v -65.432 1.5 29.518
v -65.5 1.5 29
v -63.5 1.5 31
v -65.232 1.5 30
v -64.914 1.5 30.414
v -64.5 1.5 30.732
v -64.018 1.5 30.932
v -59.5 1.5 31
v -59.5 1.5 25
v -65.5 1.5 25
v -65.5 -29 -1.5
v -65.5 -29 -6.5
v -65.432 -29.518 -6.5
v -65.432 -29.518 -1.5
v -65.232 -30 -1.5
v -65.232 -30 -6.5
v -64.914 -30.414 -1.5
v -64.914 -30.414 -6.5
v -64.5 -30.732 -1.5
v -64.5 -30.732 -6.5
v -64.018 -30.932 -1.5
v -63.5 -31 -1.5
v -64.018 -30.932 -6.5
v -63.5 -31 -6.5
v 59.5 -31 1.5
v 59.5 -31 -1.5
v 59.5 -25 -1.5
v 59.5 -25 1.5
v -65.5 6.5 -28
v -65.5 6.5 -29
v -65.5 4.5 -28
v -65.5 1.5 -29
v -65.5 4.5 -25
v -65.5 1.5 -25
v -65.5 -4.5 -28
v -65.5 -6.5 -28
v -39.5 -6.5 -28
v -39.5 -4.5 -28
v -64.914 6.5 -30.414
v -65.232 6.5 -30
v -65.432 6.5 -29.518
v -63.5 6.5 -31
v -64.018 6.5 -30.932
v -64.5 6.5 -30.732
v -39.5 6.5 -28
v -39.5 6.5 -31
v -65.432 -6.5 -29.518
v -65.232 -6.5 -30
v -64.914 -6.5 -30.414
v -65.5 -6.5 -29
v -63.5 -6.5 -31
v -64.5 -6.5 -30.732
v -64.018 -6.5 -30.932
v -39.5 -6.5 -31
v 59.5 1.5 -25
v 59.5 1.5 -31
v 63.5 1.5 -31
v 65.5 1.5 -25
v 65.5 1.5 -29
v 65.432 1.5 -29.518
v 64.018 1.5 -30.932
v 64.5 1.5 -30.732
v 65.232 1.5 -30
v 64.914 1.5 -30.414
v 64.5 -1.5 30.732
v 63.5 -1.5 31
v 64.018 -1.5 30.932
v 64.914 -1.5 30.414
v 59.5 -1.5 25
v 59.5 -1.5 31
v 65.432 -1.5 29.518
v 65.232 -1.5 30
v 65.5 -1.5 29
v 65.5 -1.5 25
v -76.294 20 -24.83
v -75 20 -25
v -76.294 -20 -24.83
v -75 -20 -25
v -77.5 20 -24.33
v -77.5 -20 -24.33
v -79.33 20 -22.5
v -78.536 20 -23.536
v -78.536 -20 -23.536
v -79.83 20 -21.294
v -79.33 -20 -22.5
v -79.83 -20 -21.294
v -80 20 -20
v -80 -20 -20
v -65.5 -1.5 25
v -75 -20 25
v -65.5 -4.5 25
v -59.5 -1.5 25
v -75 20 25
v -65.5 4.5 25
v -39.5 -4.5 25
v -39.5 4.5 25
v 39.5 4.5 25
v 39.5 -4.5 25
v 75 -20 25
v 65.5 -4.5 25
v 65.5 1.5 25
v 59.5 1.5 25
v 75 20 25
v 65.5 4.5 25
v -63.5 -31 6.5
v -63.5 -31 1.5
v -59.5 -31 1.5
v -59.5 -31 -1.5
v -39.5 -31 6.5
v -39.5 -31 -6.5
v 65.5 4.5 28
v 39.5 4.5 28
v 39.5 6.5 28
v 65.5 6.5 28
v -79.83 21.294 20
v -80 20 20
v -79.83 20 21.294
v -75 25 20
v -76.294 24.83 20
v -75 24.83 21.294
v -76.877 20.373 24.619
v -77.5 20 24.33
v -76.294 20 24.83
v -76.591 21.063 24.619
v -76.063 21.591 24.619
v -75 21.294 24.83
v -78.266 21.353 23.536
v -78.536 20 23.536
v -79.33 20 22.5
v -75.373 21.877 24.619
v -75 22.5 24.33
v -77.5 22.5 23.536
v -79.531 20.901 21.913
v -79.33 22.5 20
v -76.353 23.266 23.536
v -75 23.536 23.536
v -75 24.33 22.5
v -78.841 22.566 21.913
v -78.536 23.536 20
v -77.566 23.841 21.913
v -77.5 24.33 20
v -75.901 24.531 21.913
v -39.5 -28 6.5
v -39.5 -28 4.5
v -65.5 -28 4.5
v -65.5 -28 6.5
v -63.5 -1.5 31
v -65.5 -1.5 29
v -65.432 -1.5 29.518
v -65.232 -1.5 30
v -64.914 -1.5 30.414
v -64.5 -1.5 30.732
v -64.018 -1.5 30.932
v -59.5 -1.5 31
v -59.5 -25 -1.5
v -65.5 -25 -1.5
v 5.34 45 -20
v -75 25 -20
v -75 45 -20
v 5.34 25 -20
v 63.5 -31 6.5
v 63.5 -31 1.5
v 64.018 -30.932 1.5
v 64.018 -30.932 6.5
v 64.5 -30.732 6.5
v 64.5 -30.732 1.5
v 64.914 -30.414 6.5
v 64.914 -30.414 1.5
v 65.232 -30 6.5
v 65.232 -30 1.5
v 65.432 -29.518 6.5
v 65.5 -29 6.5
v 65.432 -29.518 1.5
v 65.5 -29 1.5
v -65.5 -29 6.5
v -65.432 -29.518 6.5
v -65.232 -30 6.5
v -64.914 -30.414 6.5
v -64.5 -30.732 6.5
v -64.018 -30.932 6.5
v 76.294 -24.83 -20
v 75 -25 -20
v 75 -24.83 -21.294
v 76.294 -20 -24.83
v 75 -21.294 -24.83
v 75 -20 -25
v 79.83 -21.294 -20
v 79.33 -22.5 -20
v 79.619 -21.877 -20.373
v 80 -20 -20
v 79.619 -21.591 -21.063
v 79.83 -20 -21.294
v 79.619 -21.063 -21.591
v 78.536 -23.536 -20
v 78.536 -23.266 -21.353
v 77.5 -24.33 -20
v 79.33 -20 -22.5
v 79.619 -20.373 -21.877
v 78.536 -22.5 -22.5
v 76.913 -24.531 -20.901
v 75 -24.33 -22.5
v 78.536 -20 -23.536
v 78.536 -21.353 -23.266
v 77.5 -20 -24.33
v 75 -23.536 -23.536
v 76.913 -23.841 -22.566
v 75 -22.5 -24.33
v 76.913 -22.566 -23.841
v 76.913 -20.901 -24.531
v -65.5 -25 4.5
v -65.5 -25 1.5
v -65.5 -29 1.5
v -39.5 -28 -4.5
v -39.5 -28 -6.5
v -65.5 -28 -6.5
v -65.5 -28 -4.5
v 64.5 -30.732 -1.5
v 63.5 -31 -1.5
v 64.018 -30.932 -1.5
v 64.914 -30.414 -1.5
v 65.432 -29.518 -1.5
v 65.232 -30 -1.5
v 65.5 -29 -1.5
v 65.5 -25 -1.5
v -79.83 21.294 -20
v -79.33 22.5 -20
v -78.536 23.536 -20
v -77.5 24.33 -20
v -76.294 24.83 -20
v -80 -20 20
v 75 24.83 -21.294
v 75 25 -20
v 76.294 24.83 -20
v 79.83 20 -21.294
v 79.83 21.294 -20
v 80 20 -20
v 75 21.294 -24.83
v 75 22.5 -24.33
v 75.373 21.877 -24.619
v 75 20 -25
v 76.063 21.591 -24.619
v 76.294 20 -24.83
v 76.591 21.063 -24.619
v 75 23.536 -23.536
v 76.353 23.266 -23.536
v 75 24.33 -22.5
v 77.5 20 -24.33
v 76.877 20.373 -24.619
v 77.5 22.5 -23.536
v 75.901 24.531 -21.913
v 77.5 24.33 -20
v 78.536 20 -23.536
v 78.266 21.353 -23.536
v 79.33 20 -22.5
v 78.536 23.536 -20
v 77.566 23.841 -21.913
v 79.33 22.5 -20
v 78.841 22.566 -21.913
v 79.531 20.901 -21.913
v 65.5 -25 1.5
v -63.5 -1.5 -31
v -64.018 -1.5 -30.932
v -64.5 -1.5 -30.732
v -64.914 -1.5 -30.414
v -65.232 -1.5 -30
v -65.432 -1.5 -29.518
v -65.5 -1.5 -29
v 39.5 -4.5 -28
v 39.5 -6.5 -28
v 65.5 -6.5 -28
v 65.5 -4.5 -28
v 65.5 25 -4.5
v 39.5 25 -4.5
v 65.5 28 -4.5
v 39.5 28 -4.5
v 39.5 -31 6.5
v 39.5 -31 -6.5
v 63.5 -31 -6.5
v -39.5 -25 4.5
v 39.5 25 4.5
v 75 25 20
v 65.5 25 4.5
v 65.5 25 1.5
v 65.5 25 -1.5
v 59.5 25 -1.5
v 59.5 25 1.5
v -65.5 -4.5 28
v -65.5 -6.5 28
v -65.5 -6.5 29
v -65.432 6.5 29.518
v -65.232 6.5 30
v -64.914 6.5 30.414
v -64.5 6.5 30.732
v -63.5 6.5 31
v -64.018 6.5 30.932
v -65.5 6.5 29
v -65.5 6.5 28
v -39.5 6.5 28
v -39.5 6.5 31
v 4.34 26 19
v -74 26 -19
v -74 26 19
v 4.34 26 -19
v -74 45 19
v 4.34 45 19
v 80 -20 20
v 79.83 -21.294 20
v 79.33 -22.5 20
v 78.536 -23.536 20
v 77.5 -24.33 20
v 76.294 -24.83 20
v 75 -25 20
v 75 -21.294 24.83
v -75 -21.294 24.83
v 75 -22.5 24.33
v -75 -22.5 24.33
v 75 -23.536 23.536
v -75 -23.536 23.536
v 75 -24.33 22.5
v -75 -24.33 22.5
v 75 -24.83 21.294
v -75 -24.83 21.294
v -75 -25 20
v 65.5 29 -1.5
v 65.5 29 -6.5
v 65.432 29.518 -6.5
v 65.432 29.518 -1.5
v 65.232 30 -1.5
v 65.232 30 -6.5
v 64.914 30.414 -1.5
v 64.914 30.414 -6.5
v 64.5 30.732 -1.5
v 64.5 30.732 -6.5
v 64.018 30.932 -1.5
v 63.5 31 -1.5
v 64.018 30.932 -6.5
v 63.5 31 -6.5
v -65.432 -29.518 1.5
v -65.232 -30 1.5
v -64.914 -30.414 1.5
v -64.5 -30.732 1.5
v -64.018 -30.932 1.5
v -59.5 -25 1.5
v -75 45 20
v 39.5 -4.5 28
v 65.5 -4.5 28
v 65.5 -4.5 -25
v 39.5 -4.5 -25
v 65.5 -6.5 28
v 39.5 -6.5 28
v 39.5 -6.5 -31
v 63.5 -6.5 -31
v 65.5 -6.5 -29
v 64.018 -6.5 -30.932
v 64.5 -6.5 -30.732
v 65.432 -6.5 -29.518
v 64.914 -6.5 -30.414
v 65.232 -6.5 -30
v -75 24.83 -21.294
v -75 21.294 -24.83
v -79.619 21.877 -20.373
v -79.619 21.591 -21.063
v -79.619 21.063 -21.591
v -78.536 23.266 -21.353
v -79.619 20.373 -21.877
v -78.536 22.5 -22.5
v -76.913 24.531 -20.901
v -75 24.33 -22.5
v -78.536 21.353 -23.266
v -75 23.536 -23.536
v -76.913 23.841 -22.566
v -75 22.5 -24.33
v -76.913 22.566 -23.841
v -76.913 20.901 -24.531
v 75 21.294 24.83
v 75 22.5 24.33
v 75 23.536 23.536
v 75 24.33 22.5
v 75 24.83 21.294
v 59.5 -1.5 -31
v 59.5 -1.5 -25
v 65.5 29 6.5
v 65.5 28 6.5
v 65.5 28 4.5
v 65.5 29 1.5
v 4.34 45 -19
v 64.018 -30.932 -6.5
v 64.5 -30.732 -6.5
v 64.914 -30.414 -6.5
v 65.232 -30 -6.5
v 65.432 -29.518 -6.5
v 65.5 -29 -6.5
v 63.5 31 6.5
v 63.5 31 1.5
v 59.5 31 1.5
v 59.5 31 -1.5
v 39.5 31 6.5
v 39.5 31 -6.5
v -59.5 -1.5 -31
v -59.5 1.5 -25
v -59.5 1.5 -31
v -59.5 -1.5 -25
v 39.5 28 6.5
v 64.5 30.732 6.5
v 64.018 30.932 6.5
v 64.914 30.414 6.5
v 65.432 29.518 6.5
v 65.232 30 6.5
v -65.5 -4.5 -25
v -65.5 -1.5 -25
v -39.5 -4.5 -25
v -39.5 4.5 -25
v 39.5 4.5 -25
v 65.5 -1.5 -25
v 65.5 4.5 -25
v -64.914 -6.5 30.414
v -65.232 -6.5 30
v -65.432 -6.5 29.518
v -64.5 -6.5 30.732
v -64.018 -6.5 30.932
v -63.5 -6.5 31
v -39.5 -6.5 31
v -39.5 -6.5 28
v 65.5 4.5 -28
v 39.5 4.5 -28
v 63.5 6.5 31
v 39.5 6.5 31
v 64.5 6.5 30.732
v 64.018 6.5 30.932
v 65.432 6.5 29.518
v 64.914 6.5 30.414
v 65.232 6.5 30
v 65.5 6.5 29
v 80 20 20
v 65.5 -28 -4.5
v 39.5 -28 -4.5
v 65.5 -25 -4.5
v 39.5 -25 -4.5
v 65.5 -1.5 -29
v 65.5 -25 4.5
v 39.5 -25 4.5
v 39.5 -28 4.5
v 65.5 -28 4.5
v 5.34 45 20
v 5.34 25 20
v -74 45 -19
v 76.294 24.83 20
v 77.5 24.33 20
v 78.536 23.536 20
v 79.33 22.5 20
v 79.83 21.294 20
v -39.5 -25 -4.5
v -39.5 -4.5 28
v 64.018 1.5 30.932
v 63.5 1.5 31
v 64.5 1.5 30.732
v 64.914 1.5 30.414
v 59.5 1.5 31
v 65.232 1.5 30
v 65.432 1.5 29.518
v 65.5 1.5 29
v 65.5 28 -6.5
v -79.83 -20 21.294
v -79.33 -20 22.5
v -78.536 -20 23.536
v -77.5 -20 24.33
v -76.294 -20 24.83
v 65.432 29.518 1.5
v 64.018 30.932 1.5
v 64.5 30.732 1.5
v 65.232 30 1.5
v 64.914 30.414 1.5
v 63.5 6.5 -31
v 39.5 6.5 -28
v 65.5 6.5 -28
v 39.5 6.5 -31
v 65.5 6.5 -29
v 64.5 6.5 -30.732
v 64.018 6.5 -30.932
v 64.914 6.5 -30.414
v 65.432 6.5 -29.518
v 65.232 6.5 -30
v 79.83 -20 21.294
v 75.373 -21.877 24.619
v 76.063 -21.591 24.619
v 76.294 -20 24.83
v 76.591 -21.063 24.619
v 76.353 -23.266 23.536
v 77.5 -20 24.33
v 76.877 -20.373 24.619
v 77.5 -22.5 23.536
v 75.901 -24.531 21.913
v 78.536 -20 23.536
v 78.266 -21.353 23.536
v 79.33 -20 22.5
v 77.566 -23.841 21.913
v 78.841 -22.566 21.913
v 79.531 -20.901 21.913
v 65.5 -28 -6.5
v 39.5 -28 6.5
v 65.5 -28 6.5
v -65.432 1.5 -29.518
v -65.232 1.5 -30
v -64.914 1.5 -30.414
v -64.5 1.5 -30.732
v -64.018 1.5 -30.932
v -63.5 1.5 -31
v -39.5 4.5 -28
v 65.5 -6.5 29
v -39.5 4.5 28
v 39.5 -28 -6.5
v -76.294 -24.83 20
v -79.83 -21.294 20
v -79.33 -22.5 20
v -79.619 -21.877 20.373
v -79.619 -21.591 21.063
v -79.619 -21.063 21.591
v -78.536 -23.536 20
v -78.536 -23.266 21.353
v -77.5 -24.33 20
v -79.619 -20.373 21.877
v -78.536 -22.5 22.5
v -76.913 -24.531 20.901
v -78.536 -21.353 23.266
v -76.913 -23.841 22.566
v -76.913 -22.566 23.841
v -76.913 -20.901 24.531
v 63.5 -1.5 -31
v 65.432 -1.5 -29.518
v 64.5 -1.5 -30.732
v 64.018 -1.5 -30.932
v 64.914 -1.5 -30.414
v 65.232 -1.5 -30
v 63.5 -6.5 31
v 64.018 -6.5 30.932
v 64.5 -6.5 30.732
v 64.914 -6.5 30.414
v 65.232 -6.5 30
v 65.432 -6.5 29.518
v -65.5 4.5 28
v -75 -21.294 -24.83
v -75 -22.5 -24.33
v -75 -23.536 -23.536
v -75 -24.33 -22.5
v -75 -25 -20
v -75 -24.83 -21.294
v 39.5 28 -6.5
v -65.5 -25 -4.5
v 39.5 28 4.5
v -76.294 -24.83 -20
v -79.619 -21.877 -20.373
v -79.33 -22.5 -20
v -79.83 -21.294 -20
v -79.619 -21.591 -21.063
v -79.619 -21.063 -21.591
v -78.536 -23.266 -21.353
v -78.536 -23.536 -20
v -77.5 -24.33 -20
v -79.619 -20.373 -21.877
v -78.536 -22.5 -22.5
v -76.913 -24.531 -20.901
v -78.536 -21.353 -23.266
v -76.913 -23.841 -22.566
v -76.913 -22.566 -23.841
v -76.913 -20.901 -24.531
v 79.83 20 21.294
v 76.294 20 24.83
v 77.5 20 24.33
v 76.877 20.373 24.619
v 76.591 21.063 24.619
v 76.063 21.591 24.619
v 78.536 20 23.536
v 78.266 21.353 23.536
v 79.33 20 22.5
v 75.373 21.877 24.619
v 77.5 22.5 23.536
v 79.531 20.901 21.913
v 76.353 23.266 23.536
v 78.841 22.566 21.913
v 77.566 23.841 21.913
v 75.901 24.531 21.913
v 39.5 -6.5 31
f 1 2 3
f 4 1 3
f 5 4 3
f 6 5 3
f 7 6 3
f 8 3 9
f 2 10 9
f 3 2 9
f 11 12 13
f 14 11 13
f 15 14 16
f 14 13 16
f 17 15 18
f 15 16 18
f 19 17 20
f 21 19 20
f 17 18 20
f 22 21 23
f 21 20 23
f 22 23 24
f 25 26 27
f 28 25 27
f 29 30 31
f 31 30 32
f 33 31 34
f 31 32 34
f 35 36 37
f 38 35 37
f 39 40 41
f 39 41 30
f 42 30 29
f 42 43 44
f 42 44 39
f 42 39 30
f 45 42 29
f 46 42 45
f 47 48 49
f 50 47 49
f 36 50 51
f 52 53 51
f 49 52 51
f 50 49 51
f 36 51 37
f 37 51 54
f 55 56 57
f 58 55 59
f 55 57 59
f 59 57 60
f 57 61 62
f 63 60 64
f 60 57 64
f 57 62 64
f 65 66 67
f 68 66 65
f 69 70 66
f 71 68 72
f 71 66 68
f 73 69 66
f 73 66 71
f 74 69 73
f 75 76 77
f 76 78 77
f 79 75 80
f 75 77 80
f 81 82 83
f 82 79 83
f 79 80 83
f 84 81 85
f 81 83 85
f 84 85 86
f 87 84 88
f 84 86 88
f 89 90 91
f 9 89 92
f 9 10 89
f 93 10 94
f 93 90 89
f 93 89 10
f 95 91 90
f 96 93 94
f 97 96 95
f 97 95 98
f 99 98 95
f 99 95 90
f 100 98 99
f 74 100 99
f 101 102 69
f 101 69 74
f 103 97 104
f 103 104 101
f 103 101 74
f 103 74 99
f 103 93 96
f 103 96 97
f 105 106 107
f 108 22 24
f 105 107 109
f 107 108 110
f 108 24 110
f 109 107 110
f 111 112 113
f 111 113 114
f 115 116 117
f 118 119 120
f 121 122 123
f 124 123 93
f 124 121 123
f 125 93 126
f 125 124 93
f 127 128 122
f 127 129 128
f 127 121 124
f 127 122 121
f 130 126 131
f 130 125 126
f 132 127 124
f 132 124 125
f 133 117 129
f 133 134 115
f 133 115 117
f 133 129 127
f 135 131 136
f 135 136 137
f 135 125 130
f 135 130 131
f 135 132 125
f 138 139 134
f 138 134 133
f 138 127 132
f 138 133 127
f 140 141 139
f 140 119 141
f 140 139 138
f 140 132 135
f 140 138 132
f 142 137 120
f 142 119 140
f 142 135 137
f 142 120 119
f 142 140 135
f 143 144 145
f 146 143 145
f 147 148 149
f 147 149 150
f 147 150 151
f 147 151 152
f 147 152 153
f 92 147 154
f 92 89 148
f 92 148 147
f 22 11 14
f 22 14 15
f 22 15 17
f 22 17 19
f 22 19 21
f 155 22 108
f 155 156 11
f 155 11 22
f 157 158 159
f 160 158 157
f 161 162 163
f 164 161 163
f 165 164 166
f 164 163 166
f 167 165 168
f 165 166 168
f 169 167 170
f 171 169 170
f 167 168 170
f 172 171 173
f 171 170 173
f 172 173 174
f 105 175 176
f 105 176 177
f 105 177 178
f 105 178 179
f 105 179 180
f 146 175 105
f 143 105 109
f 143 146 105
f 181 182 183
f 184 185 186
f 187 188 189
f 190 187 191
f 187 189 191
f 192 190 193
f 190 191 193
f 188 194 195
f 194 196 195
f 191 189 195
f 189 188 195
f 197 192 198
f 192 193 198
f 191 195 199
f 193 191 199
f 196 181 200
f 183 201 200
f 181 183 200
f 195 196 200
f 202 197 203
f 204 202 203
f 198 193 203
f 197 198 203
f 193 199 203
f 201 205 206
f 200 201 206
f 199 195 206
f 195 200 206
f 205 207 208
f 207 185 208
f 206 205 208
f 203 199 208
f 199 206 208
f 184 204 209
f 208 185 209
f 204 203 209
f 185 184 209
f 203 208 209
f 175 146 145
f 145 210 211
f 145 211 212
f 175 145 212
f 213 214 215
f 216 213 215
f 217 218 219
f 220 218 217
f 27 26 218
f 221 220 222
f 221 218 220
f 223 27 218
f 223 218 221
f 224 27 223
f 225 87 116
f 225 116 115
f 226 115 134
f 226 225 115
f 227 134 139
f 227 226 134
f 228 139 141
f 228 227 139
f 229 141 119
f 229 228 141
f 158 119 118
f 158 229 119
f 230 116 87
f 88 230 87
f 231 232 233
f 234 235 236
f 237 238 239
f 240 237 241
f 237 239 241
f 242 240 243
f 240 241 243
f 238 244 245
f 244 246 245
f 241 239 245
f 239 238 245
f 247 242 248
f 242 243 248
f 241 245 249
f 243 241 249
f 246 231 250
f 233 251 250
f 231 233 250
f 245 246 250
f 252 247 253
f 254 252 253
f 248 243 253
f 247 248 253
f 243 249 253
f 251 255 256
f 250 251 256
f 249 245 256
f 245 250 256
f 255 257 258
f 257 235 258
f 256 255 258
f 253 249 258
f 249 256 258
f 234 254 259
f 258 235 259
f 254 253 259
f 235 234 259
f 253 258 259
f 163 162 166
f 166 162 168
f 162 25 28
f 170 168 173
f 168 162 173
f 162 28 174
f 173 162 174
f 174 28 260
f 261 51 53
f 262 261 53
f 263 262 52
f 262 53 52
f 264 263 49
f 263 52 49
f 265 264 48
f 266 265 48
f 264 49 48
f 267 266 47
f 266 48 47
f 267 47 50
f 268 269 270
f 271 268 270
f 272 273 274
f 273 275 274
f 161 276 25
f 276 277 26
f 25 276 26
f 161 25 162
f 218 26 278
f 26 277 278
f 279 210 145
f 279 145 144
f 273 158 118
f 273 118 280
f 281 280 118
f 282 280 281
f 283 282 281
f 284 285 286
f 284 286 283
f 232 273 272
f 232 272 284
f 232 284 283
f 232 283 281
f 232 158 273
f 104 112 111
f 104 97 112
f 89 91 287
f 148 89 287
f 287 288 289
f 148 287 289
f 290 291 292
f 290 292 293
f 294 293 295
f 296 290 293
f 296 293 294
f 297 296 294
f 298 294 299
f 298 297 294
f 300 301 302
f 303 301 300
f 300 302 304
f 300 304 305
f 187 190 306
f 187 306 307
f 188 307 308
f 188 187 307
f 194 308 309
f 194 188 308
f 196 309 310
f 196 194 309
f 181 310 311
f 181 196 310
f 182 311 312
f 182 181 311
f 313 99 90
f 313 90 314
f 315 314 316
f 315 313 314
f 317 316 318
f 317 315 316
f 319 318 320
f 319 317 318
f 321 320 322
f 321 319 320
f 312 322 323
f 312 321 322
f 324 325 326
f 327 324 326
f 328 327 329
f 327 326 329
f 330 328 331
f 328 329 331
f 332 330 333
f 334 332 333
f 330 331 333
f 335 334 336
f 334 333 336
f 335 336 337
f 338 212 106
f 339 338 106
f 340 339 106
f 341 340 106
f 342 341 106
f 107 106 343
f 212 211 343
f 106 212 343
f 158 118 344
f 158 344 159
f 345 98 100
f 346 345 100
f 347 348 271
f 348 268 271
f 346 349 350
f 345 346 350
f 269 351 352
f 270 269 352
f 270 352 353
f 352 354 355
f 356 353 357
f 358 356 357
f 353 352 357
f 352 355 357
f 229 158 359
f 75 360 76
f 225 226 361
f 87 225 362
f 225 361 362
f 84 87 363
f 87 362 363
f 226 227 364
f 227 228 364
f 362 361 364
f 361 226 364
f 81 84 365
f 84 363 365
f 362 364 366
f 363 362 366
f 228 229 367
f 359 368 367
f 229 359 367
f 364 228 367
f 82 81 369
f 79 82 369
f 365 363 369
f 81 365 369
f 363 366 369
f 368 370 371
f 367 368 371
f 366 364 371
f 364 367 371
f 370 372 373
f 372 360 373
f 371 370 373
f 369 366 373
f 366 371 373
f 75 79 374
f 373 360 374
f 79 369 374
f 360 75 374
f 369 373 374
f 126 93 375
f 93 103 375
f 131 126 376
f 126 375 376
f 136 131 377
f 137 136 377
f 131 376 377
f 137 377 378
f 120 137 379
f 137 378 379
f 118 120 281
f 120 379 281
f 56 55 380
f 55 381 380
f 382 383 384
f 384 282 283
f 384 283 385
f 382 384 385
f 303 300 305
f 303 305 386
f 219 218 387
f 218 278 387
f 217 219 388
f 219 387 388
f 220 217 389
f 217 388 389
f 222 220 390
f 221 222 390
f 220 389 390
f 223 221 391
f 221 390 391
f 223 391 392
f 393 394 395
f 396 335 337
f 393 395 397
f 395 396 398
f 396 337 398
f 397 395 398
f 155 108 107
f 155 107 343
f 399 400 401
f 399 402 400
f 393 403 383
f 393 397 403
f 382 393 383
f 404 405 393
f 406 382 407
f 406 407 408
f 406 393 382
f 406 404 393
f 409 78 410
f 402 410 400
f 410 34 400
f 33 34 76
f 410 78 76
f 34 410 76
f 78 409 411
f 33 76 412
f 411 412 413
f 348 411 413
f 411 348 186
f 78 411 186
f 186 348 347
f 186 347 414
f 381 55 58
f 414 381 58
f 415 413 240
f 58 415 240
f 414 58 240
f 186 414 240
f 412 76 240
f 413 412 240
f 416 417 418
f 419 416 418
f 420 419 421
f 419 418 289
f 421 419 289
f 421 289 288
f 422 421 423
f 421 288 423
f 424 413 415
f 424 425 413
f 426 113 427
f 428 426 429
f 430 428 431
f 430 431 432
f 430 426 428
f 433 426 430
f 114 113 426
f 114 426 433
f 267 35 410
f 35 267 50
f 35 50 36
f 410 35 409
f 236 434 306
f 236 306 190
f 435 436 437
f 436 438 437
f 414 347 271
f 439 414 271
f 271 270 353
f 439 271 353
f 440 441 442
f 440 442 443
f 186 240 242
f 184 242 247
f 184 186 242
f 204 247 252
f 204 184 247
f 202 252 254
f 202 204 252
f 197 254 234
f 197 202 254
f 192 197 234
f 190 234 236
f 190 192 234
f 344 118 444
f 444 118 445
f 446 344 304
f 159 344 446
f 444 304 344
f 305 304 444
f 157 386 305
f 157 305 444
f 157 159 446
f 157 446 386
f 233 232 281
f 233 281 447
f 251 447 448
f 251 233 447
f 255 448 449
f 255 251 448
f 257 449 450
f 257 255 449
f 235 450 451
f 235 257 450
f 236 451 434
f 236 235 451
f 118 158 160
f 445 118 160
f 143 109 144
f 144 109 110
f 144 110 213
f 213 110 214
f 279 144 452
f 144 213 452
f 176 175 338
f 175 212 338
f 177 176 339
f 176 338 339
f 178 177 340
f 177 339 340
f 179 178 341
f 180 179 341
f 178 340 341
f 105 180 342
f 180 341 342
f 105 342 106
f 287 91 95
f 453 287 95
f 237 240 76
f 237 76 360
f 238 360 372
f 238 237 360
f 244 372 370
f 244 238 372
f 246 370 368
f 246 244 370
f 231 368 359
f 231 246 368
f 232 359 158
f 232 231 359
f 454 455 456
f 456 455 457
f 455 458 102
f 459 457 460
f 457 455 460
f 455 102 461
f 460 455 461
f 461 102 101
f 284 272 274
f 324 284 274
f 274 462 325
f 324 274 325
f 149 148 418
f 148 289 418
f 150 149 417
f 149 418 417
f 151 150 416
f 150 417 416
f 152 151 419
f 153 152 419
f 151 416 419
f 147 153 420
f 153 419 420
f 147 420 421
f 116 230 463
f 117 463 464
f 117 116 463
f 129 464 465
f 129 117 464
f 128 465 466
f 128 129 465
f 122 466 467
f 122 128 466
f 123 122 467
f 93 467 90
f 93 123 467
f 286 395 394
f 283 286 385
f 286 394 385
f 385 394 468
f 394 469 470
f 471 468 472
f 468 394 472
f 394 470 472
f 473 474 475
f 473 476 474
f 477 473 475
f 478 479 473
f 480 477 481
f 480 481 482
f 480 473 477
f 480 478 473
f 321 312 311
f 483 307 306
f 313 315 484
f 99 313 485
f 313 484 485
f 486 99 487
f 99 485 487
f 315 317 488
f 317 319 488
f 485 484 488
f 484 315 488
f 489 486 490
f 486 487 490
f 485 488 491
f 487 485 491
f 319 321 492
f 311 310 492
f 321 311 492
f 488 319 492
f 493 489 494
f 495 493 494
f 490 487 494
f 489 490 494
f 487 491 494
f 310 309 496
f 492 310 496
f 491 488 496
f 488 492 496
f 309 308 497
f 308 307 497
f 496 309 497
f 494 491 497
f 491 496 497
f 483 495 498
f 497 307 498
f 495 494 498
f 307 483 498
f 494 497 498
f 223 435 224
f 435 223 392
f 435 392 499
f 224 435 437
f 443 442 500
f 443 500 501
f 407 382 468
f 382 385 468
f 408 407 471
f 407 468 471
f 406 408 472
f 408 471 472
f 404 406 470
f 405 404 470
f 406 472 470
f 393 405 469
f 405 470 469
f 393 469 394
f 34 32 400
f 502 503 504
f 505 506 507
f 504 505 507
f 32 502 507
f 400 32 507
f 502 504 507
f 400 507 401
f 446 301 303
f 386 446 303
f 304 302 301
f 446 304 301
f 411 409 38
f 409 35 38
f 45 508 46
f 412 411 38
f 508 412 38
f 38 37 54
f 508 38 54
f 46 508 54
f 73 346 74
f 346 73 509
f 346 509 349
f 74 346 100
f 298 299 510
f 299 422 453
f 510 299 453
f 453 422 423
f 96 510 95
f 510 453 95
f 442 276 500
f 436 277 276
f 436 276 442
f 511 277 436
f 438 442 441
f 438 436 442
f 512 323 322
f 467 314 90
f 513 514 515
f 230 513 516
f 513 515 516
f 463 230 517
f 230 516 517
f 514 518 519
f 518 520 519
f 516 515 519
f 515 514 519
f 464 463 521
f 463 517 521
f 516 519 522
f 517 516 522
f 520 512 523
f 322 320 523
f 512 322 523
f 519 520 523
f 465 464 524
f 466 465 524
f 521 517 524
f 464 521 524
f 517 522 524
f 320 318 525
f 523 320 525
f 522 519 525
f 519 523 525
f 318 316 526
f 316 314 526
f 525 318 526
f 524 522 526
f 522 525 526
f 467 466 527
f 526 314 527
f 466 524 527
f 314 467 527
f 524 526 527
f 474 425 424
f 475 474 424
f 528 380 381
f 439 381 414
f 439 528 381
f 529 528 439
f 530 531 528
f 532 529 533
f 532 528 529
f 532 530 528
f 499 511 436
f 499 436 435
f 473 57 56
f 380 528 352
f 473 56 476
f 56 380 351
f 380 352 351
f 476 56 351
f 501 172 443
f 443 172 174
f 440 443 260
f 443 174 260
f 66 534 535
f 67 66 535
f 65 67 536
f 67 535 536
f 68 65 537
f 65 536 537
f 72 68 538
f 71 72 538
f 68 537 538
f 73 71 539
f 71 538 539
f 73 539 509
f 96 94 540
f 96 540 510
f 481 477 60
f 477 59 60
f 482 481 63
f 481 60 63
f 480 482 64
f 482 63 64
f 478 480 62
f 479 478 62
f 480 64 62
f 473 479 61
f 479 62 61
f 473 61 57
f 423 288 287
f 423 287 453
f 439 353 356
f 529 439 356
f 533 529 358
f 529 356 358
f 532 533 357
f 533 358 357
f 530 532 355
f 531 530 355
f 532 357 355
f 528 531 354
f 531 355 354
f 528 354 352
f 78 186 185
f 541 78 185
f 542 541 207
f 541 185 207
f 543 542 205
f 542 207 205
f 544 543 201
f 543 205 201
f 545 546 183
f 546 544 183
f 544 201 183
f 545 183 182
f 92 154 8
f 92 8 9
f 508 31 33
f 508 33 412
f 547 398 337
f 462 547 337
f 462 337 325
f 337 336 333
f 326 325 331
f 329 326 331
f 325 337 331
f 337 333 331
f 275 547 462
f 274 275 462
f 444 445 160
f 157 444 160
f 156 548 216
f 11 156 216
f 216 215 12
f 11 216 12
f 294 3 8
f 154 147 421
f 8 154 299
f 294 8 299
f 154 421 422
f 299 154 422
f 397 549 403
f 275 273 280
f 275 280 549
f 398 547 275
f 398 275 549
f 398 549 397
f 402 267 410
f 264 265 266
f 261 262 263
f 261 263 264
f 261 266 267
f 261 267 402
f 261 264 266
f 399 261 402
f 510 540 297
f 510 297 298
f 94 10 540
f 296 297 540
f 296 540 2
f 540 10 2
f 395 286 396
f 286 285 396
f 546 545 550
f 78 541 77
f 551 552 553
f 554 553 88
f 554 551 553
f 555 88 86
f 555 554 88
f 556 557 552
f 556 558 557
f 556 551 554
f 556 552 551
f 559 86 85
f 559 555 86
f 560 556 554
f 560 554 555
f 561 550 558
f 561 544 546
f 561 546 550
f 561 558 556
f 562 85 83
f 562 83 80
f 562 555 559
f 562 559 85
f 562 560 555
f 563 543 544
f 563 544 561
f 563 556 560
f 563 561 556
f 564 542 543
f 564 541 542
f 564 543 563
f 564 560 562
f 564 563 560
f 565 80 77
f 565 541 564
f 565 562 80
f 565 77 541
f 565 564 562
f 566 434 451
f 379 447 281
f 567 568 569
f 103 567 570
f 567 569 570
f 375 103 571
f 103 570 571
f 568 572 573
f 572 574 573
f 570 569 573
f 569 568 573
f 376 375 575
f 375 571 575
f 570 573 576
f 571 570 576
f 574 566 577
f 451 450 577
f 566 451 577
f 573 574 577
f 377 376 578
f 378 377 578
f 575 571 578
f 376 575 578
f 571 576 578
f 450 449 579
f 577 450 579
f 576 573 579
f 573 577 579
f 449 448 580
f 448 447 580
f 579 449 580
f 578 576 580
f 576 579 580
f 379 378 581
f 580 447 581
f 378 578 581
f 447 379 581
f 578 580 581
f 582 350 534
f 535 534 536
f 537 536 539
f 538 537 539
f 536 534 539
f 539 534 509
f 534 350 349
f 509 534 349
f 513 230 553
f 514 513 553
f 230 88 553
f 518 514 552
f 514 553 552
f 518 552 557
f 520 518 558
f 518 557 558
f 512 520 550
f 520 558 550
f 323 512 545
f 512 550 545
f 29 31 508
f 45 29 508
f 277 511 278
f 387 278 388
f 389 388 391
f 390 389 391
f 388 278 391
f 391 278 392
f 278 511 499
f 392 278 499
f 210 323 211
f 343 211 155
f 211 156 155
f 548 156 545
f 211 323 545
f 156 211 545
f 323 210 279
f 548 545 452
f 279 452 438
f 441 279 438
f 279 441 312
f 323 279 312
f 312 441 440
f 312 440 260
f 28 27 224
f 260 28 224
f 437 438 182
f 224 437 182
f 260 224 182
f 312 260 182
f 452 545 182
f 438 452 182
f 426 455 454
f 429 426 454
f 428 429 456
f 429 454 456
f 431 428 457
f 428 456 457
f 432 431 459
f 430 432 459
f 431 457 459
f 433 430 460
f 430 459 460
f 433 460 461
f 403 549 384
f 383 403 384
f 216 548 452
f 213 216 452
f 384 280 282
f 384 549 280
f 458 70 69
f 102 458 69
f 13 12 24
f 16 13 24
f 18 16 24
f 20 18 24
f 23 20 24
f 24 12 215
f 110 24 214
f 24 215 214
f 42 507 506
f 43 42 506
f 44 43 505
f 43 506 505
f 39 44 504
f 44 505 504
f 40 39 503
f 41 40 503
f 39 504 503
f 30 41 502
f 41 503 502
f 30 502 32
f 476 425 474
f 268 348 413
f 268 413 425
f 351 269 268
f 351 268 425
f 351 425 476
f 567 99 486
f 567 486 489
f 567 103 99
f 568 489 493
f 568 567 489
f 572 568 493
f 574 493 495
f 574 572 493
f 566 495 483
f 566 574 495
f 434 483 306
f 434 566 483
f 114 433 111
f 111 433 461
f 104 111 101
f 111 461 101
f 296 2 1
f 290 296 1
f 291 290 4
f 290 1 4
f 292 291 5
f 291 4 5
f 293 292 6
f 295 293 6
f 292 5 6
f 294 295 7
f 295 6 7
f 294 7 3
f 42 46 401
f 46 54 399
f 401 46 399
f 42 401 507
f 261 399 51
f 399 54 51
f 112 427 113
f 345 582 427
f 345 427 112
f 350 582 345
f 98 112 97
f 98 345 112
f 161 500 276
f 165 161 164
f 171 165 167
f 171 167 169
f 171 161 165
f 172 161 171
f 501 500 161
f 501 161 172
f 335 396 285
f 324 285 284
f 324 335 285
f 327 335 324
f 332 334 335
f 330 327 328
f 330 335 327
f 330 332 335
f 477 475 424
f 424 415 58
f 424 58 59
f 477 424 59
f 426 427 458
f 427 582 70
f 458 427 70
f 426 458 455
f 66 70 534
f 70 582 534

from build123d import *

# Parameters (mm, degrees)
SKETCH1_W               = 160
SKETCH1_H               = 50
BOSS_EXTRUDE1_DEPTH     = 25
SKETCH2_W               = 26
SKETCH2_H               = 13
CONNECTOR_BASE_DEPTH    = 6
SKETCH3_W               = 2
SKETCH3_H               = 3
DOVETAIL_CUT_DEPTH      = 151.851748415
FILLET1_R               = 2
SKETCH4_W               = 3
SKETCH4_H               = 6
CUT_EXTRUDE1_DEPTH      = 6
CIRPATTERN1_START       = -4.5
CIRPATTERN1_OUTLINE_W   = 20
CIRPATTERN1_OUTLINE_H   = 6
CIRPATTERN1_DEPTH       = 9
CIRPATTERN1_START_2     = -6.5
CIRPATTERN1_2_OUTLINE_W = 20
CIRPATTERN1_2_OUTLINE_H = 3
CIRPATTERN1_2_DEPTH     = 13
CIRPATTERN1_3_DEPTH     = 3
CIRPATTERN1_START_3     = 1.5
CIRPATTERN1_4_DEPTH     = 3
CIRPATTERN1_5_DEPTH     = 2
CIRPATTERN1_START_4     = 4.5
CIRPATTERN1_6_DEPTH     = 2
CIRPATTERN1_7_OUTLINE_W = 20
CIRPATTERN1_7_OUTLINE_H = 6
CIRPATTERN1_7_DEPTH     = 9
CIRPATTERN1_8_OUTLINE_W = 20
CIRPATTERN1_8_OUTLINE_H = 3
CIRPATTERN1_8_DEPTH     = 13
CIRPATTERN1_9_DEPTH     = 3
CIRPATTERN1_10_DEPTH    = 3
CIRPATTERN1_11_DEPTH    = 2
CIRPATTERN1_12_DEPTH    = 2
MIRROR1_START           = -4.5
MIRROR1_OUTLINE_W       = 20
MIRROR1_OUTLINE_H       = 6
MIRROR1_DEPTH           = 9
MIRROR1_START_2         = -6.5
MIRROR1_2_OUTLINE_W     = 20
MIRROR1_2_OUTLINE_H     = 3
MIRROR1_2_DEPTH         = 13
MIRROR1_3_DEPTH         = 3
MIRROR1_START_3         = 1.5
MIRROR1_4_DEPTH         = 3
MIRROR1_5_DEPTH         = 2
MIRROR1_START_4         = 4.5
MIRROR1_6_DEPTH         = 2
MIRROR1_7_OUTLINE_W     = 20
MIRROR1_7_OUTLINE_H     = 6
MIRROR1_7_DEPTH         = 9
MIRROR1_8_OUTLINE_W     = 20
MIRROR1_8_OUTLINE_H     = 3
MIRROR1_8_DEPTH         = 13
MIRROR1_9_DEPTH         = 3
MIRROR1_10_DEPTH        = 3
MIRROR1_11_DEPTH        = 2
MIRROR1_12_DEPTH        = 2
FILLET2_R               = 5
SKETCH5_W               = 26
SKETCH5_H               = 13
CUT_EXTRUDE2_DEPTH      = 103.454868113
SKETCH6_W               = 80.339783693
SKETCH6_H               = 40
BOSS_EXTRUDE2_DEPTH     = 20
SHELL1_T                = -1


# Read off the part's stored shape, not the designer's step: CirPattern1, Mirror1
with BuildPart() as part:
    # Sketch1 → Boss-Extrude1 (new, symmetric)
    with BuildSketch(Plane(origin=(0, 0, 0), x_dir=(1, 0, 0), z_dir=(0, 1, 0))):
        Rectangle(SKETCH1_W, SKETCH1_H)
    extrude(amount=BOSS_EXTRUDE1_DEPTH, both=True)

    # Sketch2 → connector base (add)
    with BuildSketch(Plane(origin=(0, 25, 0), x_dir=(1, 0, 0), z_dir=(0, 1, 0))):
        with Locations((-52.5, 0)):
            Rectangle(SKETCH2_W, SKETCH2_H)
    extrude(amount=CONNECTOR_BASE_DEPTH)

    # Sketch3 → dovetail cut (cut, through all)
    with BuildSketch(Plane.ZY.offset(65.5)):
        with Locations((5.5, 26.5)):
            Rectangle(SKETCH3_W, SKETCH3_H)
        with Locations((-5.5, 26.5)):
            Rectangle(SKETCH3_W, SKETCH3_H)
    extrude(amount=-DOVETAIL_CUT_DEPTH, mode=Mode.SUBTRACT)

    # Fillet1
    fillet1_edges = [part.edges().sort_by_distance(p)[0] for p in [
        (-65.5, 31, 0),
    ]]
    fillet(fillet1_edges, radius=FILLET1_R)

    # Sketch4 → Cut-Extrude1 (cut)
    with BuildSketch(Plane.ZY.offset(65.5)):
        with Locations((0, 28)):
            Rectangle(SKETCH4_W, SKETCH4_H)
    extrude(amount=-CUT_EXTRUDE1_DEPTH, mode=Mode.SUBTRACT)

    # CirPattern1 outline → CirPattern1 (add)
    with BuildSketch(Plane(origin=(0, 0, 0), x_dir=(1, 0, 0), z_dir=(0, 1, 0)).offset(CIRPATTERN1_START)):
        with Locations((-49.5, 28)):
            Rectangle(CIRPATTERN1_OUTLINE_W, CIRPATTERN1_OUTLINE_H)
        with Locations((-49.5, -28)):
            Rectangle(CIRPATTERN1_OUTLINE_W, CIRPATTERN1_OUTLINE_H)
    extrude(amount=CIRPATTERN1_DEPTH)

    # CirPattern1 2 outline → CirPattern1 2 (add)
    with BuildSketch(Plane(origin=(0, 0, 0), x_dir=(1, 0, 0), z_dir=(0, 1, 0)).offset(CIRPATTERN1_START_2)):
        with Locations((-49.5, 29.5)):
            Rectangle(CIRPATTERN1_2_OUTLINE_W, CIRPATTERN1_2_OUTLINE_H)
        with Locations((-49.5, -29.5)):
            Rectangle(CIRPATTERN1_2_OUTLINE_W, CIRPATTERN1_2_OUTLINE_H)
    extrude(amount=CIRPATTERN1_2_DEPTH)

    # CirPattern1 3 outline → CirPattern1 3 (add)
    with BuildSketch(Plane(origin=(0, 0, 0), x_dir=(1, 0, 0), z_dir=(0, 1, 0)).offset(CIRPATTERN1_START)):
        with BuildLine():
            Line((-65.5, 25), (-59.5, 25))
            Line((-59.5, 25), (-59.5, 31))
            Line((-59.5, 31), (-63.5, 31))
            ThreePointArc((-63.5, 31), (-64.914213562, 30.414213562), (-65.5, 29))
            Line((-65.5, 29), (-65.5, 25))
        make_face()
        with BuildLine():
            ThreePointArc((-65.5, -29), (-64.914213562, -30.414213562), (-63.5, -31))
            Line((-63.5, -31), (-59.5, -31))
            Line((-59.5, -31), (-59.5, -25))
            Line((-59.5, -25), (-65.5, -25))
            Line((-65.5, -25), (-65.5, -29))
        make_face()
    extrude(amount=CIRPATTERN1_3_DEPTH)

    # CirPattern1 4 outline → CirPattern1 4 (add)
    with BuildSketch(Plane(origin=(0, 0, 0), x_dir=(1, 0, 0), z_dir=(0, 1, 0)).offset(CIRPATTERN1_START_3)):
        with BuildLine():
            Line((-65.5, 25), (-59.5, 25))
            Line((-59.5, 25), (-59.5, 31))
            Line((-59.5, 31), (-63.5, 31))
            ThreePointArc((-63.5, 31), (-64.914213562, 30.414213562), (-65.5, 29))
            Line((-65.5, 29), (-65.5, 25))
        make_face()
        with BuildLine():
            ThreePointArc((-65.5, -29), (-64.914213562, -30.414213562), (-63.5, -31))
            Line((-63.5, -31), (-59.5, -31))
            Line((-59.5, -31), (-59.5, -25))
            Line((-59.5, -25), (-65.5, -25))
            Line((-65.5, -25), (-65.5, -29))
        make_face()
    extrude(amount=CIRPATTERN1_4_DEPTH)

    # CirPattern1 5 outline → CirPattern1 5 (add)
    with BuildSketch(Plane(origin=(0, 0, 0), x_dir=(1, 0, 0), z_dir=(0, 1, 0)).offset(CIRPATTERN1_START_2)):
        with BuildLine():
            Line((-65.5, 29), (-65.5, 28))
            Line((-65.5, 28), (-59.5, 28))
            Line((-59.5, 28), (-59.5, 31))
            Line((-59.5, 31), (-63.5, 31))
            ThreePointArc((-63.5, 31), (-64.914213562, 30.414213562), (-65.5, 29))
        make_face()
        with BuildLine():
            Line((-65.5, -28), (-65.5, -29))
            ThreePointArc((-65.5, -29), (-64.914213562, -30.414213562), (-63.5, -31))
            Line((-63.5, -31), (-59.5, -31))
            Line((-59.5, -31), (-59.5, -28))
            Line((-59.5, -28), (-65.5, -28))
        make_face()
    extrude(amount=CIRPATTERN1_5_DEPTH)

    # CirPattern1 6 outline → CirPattern1 6 (add)
    with BuildSketch(Plane(origin=(0, 0, 0), x_dir=(1, 0, 0), z_dir=(0, 1, 0)).offset(CIRPATTERN1_START_4)):
        with BuildLine():
            Line((-65.5, 29), (-65.5, 28))
            Line((-65.5, 28), (-59.5, 28))
            Line((-59.5, 28), (-59.5, 31))
            Line((-59.5, 31), (-63.5, 31))
            ThreePointArc((-63.5, 31), (-64.914213562, 30.414213562), (-65.5, 29))
        make_face()
        with BuildLine():
            Line((-65.5, -28), (-65.5, -29))
            ThreePointArc((-65.5, -29), (-64.914213562, -30.414213562), (-63.5, -31))
            Line((-63.5, -31), (-59.5, -31))
            Line((-59.5, -31), (-59.5, -28))
            Line((-59.5, -28), (-65.5, -28))
        make_face()
    extrude(amount=CIRPATTERN1_6_DEPTH)

    # CirPattern1 7 outline → CirPattern1 7 (add)
    with BuildSketch(Plane.XY.offset(CIRPATTERN1_START)):
        with Locations((-49.5, -28)):
            Rectangle(CIRPATTERN1_7_OUTLINE_W, CIRPATTERN1_7_OUTLINE_H)
    extrude(amount=CIRPATTERN1_7_DEPTH)

    # CirPattern1 8 outline → CirPattern1 8 (add)
    with BuildSketch(Plane.XY.offset(CIRPATTERN1_START_2)):
        with Locations((-49.5, -29.5)):
            Rectangle(CIRPATTERN1_8_OUTLINE_W, CIRPATTERN1_8_OUTLINE_H)
    extrude(amount=CIRPATTERN1_8_DEPTH)

    # CirPattern1 9 outline → CirPattern1 9 (add)
    with BuildSketch(Plane.XY.offset(CIRPATTERN1_START)):
        with BuildLine():
            ThreePointArc((-65.5, -29), (-64.914213562, -30.414213562), (-63.5, -31))
            Line((-63.5, -31), (-59.5, -31))
            Line((-59.5, -31), (-59.5, -25))
            Line((-59.5, -25), (-65.5, -25))
            Line((-65.5, -25), (-65.5, -29))
        make_face()
    extrude(amount=CIRPATTERN1_9_DEPTH)

    # CirPattern1 10 outline → CirPattern1 10 (add)
    with BuildSketch(Plane.XY.offset(CIRPATTERN1_START_3)):
        with BuildLine():
            ThreePointArc((-65.5, -29), (-64.914213562, -30.414213562), (-63.5, -31))
            Line((-63.5, -31), (-59.5, -31))
            Line((-59.5, -31), (-59.5, -25))
            Line((-59.5, -25), (-65.5, -25))
            Line((-65.5, -25), (-65.5, -29))
        make_face()
    extrude(amount=CIRPATTERN1_10_DEPTH)

    # CirPattern1 11 outline → CirPattern1 11 (add)
    with BuildSketch(Plane.XY.offset(CIRPATTERN1_START_2)):
        with BuildLine():
            Line((-65.5, -28), (-65.5, -29))
            ThreePointArc((-65.5, -29), (-64.914213562, -30.414213562), (-63.5, -31))
            Line((-63.5, -31), (-59.5, -31))
            Line((-59.5, -31), (-59.5, -28))
            Line((-59.5, -28), (-65.5, -28))
        make_face()
    extrude(amount=CIRPATTERN1_11_DEPTH)

    # CirPattern1 12 outline → CirPattern1 12 (add)
    with BuildSketch(Plane.XY.offset(CIRPATTERN1_START_4)):
        with BuildLine():
            Line((-65.5, -28), (-65.5, -29))
            ThreePointArc((-65.5, -29), (-64.914213562, -30.414213562), (-63.5, -31))
            Line((-63.5, -31), (-59.5, -31))
            Line((-59.5, -31), (-59.5, -28))
            Line((-59.5, -28), (-65.5, -28))
        make_face()
    extrude(amount=CIRPATTERN1_12_DEPTH)

    # Mirror1 outline → Mirror1 (add)
    with BuildSketch(Plane.XY.offset(MIRROR1_START)):
        with Locations((49.5, 28)):
            Rectangle(MIRROR1_OUTLINE_W, MIRROR1_OUTLINE_H)
        with Locations((49.5, -28)):
            Rectangle(MIRROR1_OUTLINE_W, MIRROR1_OUTLINE_H)
    extrude(amount=MIRROR1_DEPTH)

    # Mirror1 2 outline → Mirror1 2 (add)
    with BuildSketch(Plane.XY.offset(MIRROR1_START_2)):
        with Locations((49.5, 29.5)):
            Rectangle(MIRROR1_2_OUTLINE_W, MIRROR1_2_OUTLINE_H)
        with Locations((49.5, -29.5)):
            Rectangle(MIRROR1_2_OUTLINE_W, MIRROR1_2_OUTLINE_H)
    extrude(amount=MIRROR1_2_DEPTH)

    # Mirror1 3 outline → Mirror1 3 (add)
    with BuildSketch(Plane.XY.offset(MIRROR1_START)):
        with BuildLine():
            Line((59.5, 25), (65.5, 25))
            Line((65.5, 25), (65.5, 29))
            ThreePointArc((65.5, 29), (64.914213562, 30.414213562), (63.5, 31))
            Line((63.5, 31), (59.5, 31))
            Line((59.5, 31), (59.5, 25))
        make_face()
        with BuildLine():
            ThreePointArc((63.5, -31), (64.914213562, -30.414213562), (65.5, -29))
            Line((65.5, -29), (65.5, -25))
            Line((65.5, -25), (59.5, -25))
            Line((59.5, -25), (59.5, -31))
            Line((59.5, -31), (63.5, -31))
        make_face()
    extrude(amount=MIRROR1_3_DEPTH)

    # Mirror1 4 outline → Mirror1 4 (add)
    with BuildSketch(Plane.XY.offset(MIRROR1_START_3)):
        with BuildLine():
            Line((59.5, 25), (65.5, 25))
            Line((65.5, 25), (65.5, 29))
            ThreePointArc((65.5, 29), (64.914213562, 30.414213562), (63.5, 31))
            Line((63.5, 31), (59.5, 31))
            Line((59.5, 31), (59.5, 25))
        make_face()
        with BuildLine():
            ThreePointArc((63.5, -31), (64.914213562, -30.414213562), (65.5, -29))
            Line((65.5, -29), (65.5, -25))
            Line((65.5, -25), (59.5, -25))
            Line((59.5, -25), (59.5, -31))
            Line((59.5, -31), (63.5, -31))
        make_face()
    extrude(amount=MIRROR1_4_DEPTH)

    # Mirror1 5 outline → Mirror1 5 (add)
    with BuildSketch(Plane.XY.offset(MIRROR1_START_2)):
        with BuildLine():
            Line((59.5, 28), (65.5, 28))
            Line((65.5, 28), (65.5, 29))
            ThreePointArc((65.5, 29), (64.914213562, 30.414213562), (63.5, 31))
            Line((63.5, 31), (59.5, 31))
            Line((59.5, 31), (59.5, 28))
        make_face()
        with BuildLine():
            ThreePointArc((63.5, -31), (64.914213562, -30.414213562), (65.5, -29))
            Line((65.5, -29), (65.5, -28))
            Line((65.5, -28), (59.5, -28))
            Line((59.5, -28), (59.5, -31))
            Line((59.5, -31), (63.5, -31))
        make_face()
    extrude(amount=MIRROR1_5_DEPTH)

    # Mirror1 6 outline → Mirror1 6 (add)
    with BuildSketch(Plane.XY.offset(MIRROR1_START_4)):
        with BuildLine():
            Line((59.5, 28), (65.5, 28))
            Line((65.5, 28), (65.5, 29))
            ThreePointArc((65.5, 29), (64.914213562, 30.414213562), (63.5, 31))
            Line((63.5, 31), (59.5, 31))
            Line((59.5, 31), (59.5, 28))
        make_face()
        with BuildLine():
            ThreePointArc((63.5, -31), (64.914213562, -30.414213562), (65.5, -29))
            Line((65.5, -29), (65.5, -28))
            Line((65.5, -28), (59.5, -28))
            Line((59.5, -28), (59.5, -31))
            Line((59.5, -31), (63.5, -31))
        make_face()
    extrude(amount=MIRROR1_6_DEPTH)

    # Mirror1 7 outline → Mirror1 7 (add)
    with BuildSketch(Plane(origin=(0, 0, 0), x_dir=(1, 0, 0), z_dir=(0, 1, 0)).offset(MIRROR1_START)):
        with Locations((49.5, 28)):
            Rectangle(MIRROR1_7_OUTLINE_W, MIRROR1_7_OUTLINE_H)
        with Locations((49.5, -28)):
            Rectangle(MIRROR1_7_OUTLINE_W, MIRROR1_7_OUTLINE_H)
    extrude(amount=MIRROR1_7_DEPTH)

    # Mirror1 8 outline → Mirror1 8 (add)
    with BuildSketch(Plane(origin=(0, 0, 0), x_dir=(1, 0, 0), z_dir=(0, 1, 0)).offset(MIRROR1_START_2)):
        with Locations((49.5, 29.5)):
            Rectangle(MIRROR1_8_OUTLINE_W, MIRROR1_8_OUTLINE_H)
        with Locations((49.5, -29.5)):
            Rectangle(MIRROR1_8_OUTLINE_W, MIRROR1_8_OUTLINE_H)
    extrude(amount=MIRROR1_8_DEPTH)

    # Mirror1 9 outline → Mirror1 9 (add)
    with BuildSketch(Plane(origin=(0, 0, 0), x_dir=(1, 0, 0), z_dir=(0, 1, 0)).offset(MIRROR1_START)):
        with BuildLine():
            Line((59.5, 25), (65.5, 25))
            Line((65.5, 25), (65.5, 29))
            ThreePointArc((65.5, 29), (64.914213562, 30.414213562), (63.5, 31))
            Line((63.5, 31), (59.5, 31))
            Line((59.5, 31), (59.5, 25))
        make_face()
        with BuildLine():
            ThreePointArc((63.5, -31), (64.914213562, -30.414213562), (65.5, -29))
            Line((65.5, -29), (65.5, -25))
            Line((65.5, -25), (59.5, -25))
            Line((59.5, -25), (59.5, -31))
            Line((59.5, -31), (63.5, -31))
        make_face()
    extrude(amount=MIRROR1_9_DEPTH)

    # Mirror1 10 outline → Mirror1 10 (add)
    with BuildSketch(Plane(origin=(0, 0, 0), x_dir=(1, 0, 0), z_dir=(0, 1, 0)).offset(MIRROR1_START_3)):
        with BuildLine():
            Line((59.5, 25), (65.5, 25))
            Line((65.5, 25), (65.5, 29))
            ThreePointArc((65.5, 29), (64.914213562, 30.414213562), (63.5, 31))
            Line((63.5, 31), (59.5, 31))
            Line((59.5, 31), (59.5, 25))
        make_face()
        with BuildLine():
            ThreePointArc((63.5, -31), (64.914213562, -30.414213562), (65.5, -29))
            Line((65.5, -29), (65.5, -25))
            Line((65.5, -25), (59.5, -25))
            Line((59.5, -25), (59.5, -31))
            Line((59.5, -31), (63.5, -31))
        make_face()
    extrude(amount=MIRROR1_10_DEPTH)

    # Mirror1 11 outline → Mirror1 11 (add)
    with BuildSketch(Plane(origin=(0, 0, 0), x_dir=(1, 0, 0), z_dir=(0, 1, 0)).offset(MIRROR1_START_2)):
        with BuildLine():
            Line((59.5, 28), (65.5, 28))
            Line((65.5, 28), (65.5, 29))
            ThreePointArc((65.5, 29), (64.914213562, 30.414213562), (63.5, 31))
            Line((63.5, 31), (59.5, 31))
            Line((59.5, 31), (59.5, 28))
        make_face()
        with BuildLine():
            ThreePointArc((63.5, -31), (64.914213562, -30.414213562), (65.5, -29))
            Line((65.5, -29), (65.5, -28))
            Line((65.5, -28), (59.5, -28))
            Line((59.5, -28), (59.5, -31))
            Line((59.5, -31), (63.5, -31))
        make_face()
    extrude(amount=MIRROR1_11_DEPTH)

    # Mirror1 12 outline → Mirror1 12 (add)
    with BuildSketch(Plane(origin=(0, 0, 0), x_dir=(1, 0, 0), z_dir=(0, 1, 0)).offset(MIRROR1_START_4)):
        with BuildLine():
            Line((59.5, 28), (65.5, 28))
            Line((65.5, 28), (65.5, 29))
            ThreePointArc((65.5, 29), (64.914213562, 30.414213562), (63.5, 31))
            Line((63.5, 31), (59.5, 31))
            Line((59.5, 31), (59.5, 28))
        make_face()
        with BuildLine():
            ThreePointArc((63.5, -31), (64.914213562, -30.414213562), (65.5, -29))
            Line((65.5, -29), (65.5, -28))
            Line((65.5, -28), (59.5, -28))
            Line((59.5, -28), (59.5, -31))
            Line((59.5, -31), (63.5, -31))
        make_face()
    extrude(amount=MIRROR1_12_DEPTH)

    # Fillet2
    fillet2_edges = [part.edges().sort_by_distance(p)[0] for p in [
        (80, 25, 0),
        (0, 25, -25),
        (-80, 25, 0),
        (0, -25, -25),
        (80, -25, 0),
        (0, -25, 25),
        (-80, -25, 0),
        (-80, 0, -25),
        (80, 0, -25),
        (80, 0, 25),
        (-80, 0, 25),
        (0, 25, 25),
    ]]
    fillet(fillet2_edges, radius=FILLET2_R)

    # Sketch5 → Cut-Extrude2 (cut, through all)
    with BuildSketch(Plane(origin=(0, 25, 0), x_dir=(1, 0, 0), z_dir=(0, 1, 0))):
        with Locations((-52.5, 0)):
            Rectangle(SKETCH5_W, SKETCH5_H)
    extrude(amount=CUT_EXTRUDE2_DEPTH, mode=Mode.SUBTRACT)


with BuildPart() as body_2:
    # Sketch6 → Boss-Extrude2 (new body)
    with BuildSketch(Plane(origin=(0, 25, 0), x_dir=(1, 0, 0), z_dir=(0, 1, 0))):
        with Locations((-34.830108153, 0)):
            Rectangle(SKETCH6_W, SKETCH6_H)
    extrude(amount=BOSS_EXTRUDE2_DEPTH)

    # Shell1
    shell1_openings = [body_2.faces().sort_by_distance(p)[0] for p in [
        (-34.830108153, 45, 0),
    ]]
    offset(amount=SHELL1_T, openings=shell1_openings, kind=Kind.INTERSECTION)


solid = Compound([part.part, body_2.part])
